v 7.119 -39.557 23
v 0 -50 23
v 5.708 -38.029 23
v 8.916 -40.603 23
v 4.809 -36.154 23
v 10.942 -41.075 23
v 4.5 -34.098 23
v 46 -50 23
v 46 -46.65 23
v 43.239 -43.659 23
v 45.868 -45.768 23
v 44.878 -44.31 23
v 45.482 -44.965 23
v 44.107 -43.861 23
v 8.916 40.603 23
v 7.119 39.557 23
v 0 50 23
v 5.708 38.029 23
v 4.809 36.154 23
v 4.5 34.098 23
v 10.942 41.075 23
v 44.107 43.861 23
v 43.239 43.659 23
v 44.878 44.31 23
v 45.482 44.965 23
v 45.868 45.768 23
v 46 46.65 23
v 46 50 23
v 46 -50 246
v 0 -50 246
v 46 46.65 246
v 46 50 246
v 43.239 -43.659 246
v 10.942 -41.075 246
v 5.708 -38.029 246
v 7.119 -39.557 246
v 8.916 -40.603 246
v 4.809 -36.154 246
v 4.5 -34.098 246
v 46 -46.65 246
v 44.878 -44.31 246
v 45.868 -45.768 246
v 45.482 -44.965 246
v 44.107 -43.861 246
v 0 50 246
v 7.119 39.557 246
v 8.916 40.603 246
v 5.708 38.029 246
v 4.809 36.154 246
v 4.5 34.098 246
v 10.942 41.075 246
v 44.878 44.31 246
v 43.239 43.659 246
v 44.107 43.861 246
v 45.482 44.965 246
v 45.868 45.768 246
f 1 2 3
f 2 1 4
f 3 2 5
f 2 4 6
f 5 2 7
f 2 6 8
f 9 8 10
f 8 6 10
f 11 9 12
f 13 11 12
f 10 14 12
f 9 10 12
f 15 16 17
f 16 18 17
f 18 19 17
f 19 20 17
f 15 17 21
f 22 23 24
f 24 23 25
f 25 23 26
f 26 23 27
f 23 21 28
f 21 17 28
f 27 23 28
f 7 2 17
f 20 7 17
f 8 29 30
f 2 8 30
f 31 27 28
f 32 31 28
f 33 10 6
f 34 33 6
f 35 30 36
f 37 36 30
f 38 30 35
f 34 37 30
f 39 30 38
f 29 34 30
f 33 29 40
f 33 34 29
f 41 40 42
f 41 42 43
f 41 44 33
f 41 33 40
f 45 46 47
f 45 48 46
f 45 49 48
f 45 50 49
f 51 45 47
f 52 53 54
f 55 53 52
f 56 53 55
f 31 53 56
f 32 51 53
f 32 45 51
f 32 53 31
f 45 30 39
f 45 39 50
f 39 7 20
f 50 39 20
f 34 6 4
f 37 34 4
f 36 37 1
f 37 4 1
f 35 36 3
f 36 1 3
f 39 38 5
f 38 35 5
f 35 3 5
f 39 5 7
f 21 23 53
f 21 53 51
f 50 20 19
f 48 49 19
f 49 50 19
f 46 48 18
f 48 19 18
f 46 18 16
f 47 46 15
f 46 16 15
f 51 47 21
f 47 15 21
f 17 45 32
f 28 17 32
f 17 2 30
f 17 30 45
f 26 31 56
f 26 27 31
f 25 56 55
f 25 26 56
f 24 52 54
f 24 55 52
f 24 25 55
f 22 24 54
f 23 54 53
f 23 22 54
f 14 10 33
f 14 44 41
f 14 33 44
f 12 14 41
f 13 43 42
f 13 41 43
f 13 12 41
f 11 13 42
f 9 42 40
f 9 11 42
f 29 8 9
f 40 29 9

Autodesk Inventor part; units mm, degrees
ref_plane "Начальная плоскость" through (0, 0, 23) normal (0, 0, 1) x (1, 0, 0)
ref_plane "Конечная плоскость" through (0, 0, 246) normal (0, 0, 1) x (1, 0, 0)
sketch "Эскиз" plane through (0, 0, 0) normal (0, 0, 1) x (1, 0, 0)
  line L0 (46, -50) -> (0, -50)
  line L1 (46, -50) -> (46, -46.6496)
  line L2 (43.2392, -43.6591) -> (10.9418, -41.0753)
  line L3 (4.5, -34.0976) -> (4.5, 34.0976)
  line L4 (43.2392, 43.6591) -> (10.9418, 41.0753)
  line L5 (46, 46.6496) -> (46, 50)
  line L6 (0, 50) -> (46, 50)
  line L7 (0, -50) -> (0, 50)
  arc A0 (4.5, -34.0976) -> (10.9418, -41.0753) centre (11.5, -34.0976) ccw
  arc A1 (10.9418, 41.0753) -> (4.5, 34.0976) centre (11.5, 34.0976) ccw
  arc A2 (46, -46.6496) -> (43.2392, -43.6591) centre (43, -46.6496) ccw
  arc A3 (43.2392, 43.6591) -> (46, 46.6496) centre (43, 46.6496) ccw
  line L8 (0, 70) -> (0, -70) construction
  line L9 (-9.3169, 0) -> (55.9016, 0) construction
  point P0 (46, -43.88)
  point P1 (4.5, -40.56)
  point P2 (4.5, 40.56)
  point P3 (46, 43.88)
  dimension "d3" = 46
  dimension "d5" = 4.5
  dimension "d7" = 100
  dimension "d9" = 9.44
  dimension "d11" = 9.44
  dimension "d13" = 6.12
  dimension "d15" = 6.12
  dimension "d22" = 7
  dimension "d23" = 3
  dimension "d24" = 50
  dimension "d25" = 0
extrude "Тело" add sketch "Эскиз" along normal up to surface (223 mm away) from surface at 23
sketch "Sketch3" plane through (0, 0, 0) normal (0, 0, 1) x (1, 0, 0)
  line L0 (0, 0) -> (10, 0)
ref_plane "Work Plane7" through (0, 0, 0) normal (0, -1, 0) x (1, 0, 0)
sketch "Sketch4" plane through (0, 0, 0) normal (0, -1, 0) x (1, 0, 0)
  line L0 (-2, 23) -> (12, 23)
  line L1 (-2, 246) -> (12, 246)
  dimension "d29" = 223
ref_plane "РабПлоскость8" through (169.5, -50, 246) normal (0, 0, 1) x (1, 0, 0)
split "Разделение1" plane through (169.5, -50, 246) removes the side toward (0, 0, 1)
ref_plane "РабПлоскость9" through (-479.5, -50, 23) normal (0, 0, -1) x (-1, 0, 0)
split "Разделение2" plane through (-479.5, -50, 23) removes the side toward (0, 0, -1)
equation "\"d3\" = b"
equation "\"d5\" = t1"
equation "\"d7\" = ParH"
equation "\"d9\" = msp_x1 + t2"
equation "\"d11\" = msp_x1 + t2"
equation "\"d13\" = -msp_x2 + t2"
equation "\"d15\" = -msp_x2 + t2"
equation "\"d22\" = R"
equation "\"d23\" = R1"
equation "\"d24\" = 0.5 * d7"
equation "\"d16\" = G_L"
equation "\"R1\" = 3"
equation "\"R\" = 7"
equation "\"t1\" = 4.5"
equation "\"t2\" = 7.6"
equation "\"ParH\" = 100"
equation "\"b\" = 46"
equation "\"msp_x1\" = 0.04 * b"
equation "\"msp_x2\" = -0.08 * t1 + 0.04 * b"
equation "\"G_L\" = d29"
equation "\"ex\" = 0"
equation "\"G_OFFSET_START\" = -23"
equation "\"G_OFFSET_END\" = -23"
equation "\"d26\" = -G_OFFSET_START"
equation "\"d27\" = G_OFFSET_END + B_L"
equation "\"B_L\" = 269"
properties part number "Швеллер 10U-223 ГОСТ 8240-97" material "Сталь, мягкая"
